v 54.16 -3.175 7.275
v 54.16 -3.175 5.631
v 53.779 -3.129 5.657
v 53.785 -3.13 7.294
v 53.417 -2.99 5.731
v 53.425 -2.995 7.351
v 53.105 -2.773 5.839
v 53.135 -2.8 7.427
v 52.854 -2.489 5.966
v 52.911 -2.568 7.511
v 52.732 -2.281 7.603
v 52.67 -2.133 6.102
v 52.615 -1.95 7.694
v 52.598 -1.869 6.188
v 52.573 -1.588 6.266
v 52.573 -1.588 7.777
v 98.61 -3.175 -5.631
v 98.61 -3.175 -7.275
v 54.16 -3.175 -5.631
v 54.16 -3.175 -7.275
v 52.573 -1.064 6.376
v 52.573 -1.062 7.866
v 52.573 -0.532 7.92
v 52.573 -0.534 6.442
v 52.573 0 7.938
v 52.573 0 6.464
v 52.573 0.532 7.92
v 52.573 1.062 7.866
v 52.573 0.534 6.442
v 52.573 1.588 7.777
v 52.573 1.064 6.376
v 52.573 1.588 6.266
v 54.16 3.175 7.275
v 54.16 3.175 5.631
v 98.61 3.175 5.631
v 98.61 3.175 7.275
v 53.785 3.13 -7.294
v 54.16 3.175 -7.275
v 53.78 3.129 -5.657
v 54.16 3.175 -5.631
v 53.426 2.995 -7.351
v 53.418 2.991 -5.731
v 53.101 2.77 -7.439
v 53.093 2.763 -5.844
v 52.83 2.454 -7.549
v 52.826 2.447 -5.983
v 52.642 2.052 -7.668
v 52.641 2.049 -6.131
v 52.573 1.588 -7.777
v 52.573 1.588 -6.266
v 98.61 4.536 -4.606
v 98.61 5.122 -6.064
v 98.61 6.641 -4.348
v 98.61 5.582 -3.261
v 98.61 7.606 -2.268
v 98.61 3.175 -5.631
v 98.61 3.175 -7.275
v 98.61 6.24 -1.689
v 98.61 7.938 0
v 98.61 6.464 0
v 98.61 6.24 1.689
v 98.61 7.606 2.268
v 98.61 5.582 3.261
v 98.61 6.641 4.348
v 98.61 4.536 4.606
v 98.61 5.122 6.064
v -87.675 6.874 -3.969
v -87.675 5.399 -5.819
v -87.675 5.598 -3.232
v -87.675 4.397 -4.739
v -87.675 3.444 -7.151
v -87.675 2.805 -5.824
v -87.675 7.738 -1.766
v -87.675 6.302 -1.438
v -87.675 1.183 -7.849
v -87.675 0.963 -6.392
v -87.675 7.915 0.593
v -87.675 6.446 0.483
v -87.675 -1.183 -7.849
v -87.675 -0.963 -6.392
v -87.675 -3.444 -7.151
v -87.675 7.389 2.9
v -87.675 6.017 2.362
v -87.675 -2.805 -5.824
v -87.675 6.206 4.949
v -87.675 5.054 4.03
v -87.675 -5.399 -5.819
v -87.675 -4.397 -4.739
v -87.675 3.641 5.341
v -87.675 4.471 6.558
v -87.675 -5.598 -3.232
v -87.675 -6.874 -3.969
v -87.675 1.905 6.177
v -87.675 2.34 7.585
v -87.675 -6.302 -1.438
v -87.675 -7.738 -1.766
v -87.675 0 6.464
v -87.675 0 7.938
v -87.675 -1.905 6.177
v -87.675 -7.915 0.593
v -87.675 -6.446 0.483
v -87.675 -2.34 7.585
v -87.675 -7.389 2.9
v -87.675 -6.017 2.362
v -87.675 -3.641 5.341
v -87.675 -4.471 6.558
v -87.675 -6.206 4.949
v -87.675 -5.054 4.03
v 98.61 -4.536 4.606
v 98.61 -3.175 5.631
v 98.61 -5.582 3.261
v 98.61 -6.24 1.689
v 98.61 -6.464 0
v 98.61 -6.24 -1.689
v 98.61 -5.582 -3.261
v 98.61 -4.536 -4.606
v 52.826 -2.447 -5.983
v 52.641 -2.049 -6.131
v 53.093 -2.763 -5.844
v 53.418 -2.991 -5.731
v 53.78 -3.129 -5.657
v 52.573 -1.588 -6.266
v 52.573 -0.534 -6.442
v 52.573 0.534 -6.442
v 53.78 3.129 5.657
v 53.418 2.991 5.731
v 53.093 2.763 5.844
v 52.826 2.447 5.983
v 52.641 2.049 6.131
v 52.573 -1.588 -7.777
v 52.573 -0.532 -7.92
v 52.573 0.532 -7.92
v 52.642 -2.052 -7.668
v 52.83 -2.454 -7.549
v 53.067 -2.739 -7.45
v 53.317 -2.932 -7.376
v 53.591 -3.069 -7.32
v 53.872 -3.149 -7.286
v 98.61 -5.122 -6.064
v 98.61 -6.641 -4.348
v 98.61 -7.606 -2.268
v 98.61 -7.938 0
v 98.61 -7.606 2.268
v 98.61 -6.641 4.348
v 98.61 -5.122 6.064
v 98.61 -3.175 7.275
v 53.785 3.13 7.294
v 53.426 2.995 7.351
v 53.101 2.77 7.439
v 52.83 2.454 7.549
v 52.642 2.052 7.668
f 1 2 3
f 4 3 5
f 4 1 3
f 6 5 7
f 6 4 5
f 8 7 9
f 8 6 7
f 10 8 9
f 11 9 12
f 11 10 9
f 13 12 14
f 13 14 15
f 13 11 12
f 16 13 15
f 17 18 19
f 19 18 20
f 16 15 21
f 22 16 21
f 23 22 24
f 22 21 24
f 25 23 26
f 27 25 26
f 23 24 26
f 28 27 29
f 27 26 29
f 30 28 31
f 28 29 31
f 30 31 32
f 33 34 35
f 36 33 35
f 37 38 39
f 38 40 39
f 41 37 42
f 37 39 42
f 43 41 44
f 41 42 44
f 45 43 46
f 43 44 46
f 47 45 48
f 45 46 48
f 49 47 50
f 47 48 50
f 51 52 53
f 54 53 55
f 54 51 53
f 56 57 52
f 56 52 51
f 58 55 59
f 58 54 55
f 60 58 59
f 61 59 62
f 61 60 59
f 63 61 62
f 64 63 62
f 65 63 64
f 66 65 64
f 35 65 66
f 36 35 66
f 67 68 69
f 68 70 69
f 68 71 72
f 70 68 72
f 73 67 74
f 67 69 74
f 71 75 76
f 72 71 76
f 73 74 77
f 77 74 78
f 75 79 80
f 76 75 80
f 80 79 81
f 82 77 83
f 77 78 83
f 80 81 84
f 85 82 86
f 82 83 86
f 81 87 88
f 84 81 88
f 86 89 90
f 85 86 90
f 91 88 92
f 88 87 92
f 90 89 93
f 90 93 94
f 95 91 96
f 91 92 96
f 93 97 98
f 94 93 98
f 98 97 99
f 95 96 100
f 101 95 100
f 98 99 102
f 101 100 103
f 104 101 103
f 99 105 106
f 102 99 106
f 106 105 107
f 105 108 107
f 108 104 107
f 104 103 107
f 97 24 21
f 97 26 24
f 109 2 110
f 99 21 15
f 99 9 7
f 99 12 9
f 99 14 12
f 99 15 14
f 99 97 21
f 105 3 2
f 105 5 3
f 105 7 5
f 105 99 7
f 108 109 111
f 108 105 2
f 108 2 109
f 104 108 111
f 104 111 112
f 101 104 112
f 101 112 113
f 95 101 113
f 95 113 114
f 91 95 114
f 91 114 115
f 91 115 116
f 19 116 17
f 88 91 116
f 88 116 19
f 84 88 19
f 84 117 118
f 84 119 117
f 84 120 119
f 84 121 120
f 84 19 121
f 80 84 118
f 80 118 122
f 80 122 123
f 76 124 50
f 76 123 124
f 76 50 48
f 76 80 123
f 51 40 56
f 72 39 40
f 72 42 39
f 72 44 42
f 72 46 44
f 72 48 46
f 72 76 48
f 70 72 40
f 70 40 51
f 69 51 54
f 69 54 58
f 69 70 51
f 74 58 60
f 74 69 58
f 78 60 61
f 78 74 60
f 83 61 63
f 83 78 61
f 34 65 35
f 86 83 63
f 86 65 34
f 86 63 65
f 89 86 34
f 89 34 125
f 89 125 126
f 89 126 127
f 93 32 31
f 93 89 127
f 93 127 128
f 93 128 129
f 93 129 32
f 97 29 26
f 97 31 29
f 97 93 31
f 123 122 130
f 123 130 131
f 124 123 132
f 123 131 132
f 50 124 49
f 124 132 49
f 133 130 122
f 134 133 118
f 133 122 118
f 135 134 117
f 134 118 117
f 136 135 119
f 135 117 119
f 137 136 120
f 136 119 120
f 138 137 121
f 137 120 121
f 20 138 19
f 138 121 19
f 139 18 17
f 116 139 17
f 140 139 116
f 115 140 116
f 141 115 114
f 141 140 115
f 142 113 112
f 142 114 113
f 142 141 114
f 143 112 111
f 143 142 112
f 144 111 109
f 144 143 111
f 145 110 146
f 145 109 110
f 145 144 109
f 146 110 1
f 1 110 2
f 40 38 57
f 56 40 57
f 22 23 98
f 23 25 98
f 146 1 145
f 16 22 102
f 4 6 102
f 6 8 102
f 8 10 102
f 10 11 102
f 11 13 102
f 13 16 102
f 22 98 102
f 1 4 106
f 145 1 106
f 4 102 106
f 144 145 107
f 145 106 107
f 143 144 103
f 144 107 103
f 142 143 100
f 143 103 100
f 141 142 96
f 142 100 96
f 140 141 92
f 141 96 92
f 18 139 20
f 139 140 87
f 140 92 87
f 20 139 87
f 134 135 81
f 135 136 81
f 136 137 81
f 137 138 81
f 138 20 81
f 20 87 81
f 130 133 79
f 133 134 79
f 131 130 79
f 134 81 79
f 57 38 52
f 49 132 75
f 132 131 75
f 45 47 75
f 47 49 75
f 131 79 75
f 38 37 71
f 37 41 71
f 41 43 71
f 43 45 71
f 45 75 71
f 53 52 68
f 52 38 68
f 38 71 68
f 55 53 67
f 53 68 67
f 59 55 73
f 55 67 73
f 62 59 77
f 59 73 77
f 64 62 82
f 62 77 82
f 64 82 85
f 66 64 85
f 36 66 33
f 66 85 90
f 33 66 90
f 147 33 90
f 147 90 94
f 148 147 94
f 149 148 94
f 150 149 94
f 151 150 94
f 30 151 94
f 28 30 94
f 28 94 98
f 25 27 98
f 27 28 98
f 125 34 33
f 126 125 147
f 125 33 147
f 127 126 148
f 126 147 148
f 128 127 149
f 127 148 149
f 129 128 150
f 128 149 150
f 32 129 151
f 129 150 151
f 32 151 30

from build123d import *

# Parameters (mm, degrees)
BOSS_EXTRUDE1_DEPTH      = 98.610323
BOSS_EXTRUDE1_DEPTH_BACK = 87.674643
SKETCH1_R                = 7.9375
SKETCH1_R_2              = 6.4643
CUT_EXTRUDE1_DEPTH       = 101.194886763
FILLET1_R                = 1.5875


with BuildPart() as part:
    # Sketch1 → Boss-Extrude1 (new, two sides: drawn at the far end of the back side and taken through both)
    with BuildSketch(Plane(origin=(0, 0, 0), x_dir=(0, 0, -1), z_dir=(1, 0, 0)).offset(-BOSS_EXTRUDE1_DEPTH_BACK)):
        with Locations(Location((0, 0, 0), (0, 0, 180))):
            Circle(SKETCH1_R)
        with Locations(Location((0, 0, 0), (0, 0, 180))):
            Circle(SKETCH1_R_2, mode=Mode.SUBTRACT)
    extrude(amount=BOSS_EXTRUDE1_DEPTH + BOSS_EXTRUDE1_DEPTH_BACK)

    # Sketch2 → Cut-Extrude1 (cut, through all)
    with BuildSketch(Plane(origin=(0, 0, -7.9375), x_dir=(-1, 0, 0), z_dir=(0, 0, -1))):
        Polygon((-55.74782316, -3.175), (-54.16032316, -3.175), (-52.57282316, -3.175), (-52.57282316, 3.175), (-54.16032316, 3.175), (-55.74782316, 3.175), (-106.86532316, 3.175), (-106.86532316, -3.175), align=None)
    extrude(amount=-CUT_EXTRUDE1_DEPTH, mode=Mode.SUBTRACT)

    # Fillet1
    fillet1_edges = [part.edges().sort_by_distance(p)[0] for p in [
        (52.57282316, 3.175, -6.452847911),
        (52.57282316, 3.175, 6.452847911),
        (52.57282316, -3.175, -6.452847911),
        (52.57282316, -3.175, 6.452847911),
    ]]
    fillet(fillet1_edges, radius=FILLET1_R)


solid = part.part
